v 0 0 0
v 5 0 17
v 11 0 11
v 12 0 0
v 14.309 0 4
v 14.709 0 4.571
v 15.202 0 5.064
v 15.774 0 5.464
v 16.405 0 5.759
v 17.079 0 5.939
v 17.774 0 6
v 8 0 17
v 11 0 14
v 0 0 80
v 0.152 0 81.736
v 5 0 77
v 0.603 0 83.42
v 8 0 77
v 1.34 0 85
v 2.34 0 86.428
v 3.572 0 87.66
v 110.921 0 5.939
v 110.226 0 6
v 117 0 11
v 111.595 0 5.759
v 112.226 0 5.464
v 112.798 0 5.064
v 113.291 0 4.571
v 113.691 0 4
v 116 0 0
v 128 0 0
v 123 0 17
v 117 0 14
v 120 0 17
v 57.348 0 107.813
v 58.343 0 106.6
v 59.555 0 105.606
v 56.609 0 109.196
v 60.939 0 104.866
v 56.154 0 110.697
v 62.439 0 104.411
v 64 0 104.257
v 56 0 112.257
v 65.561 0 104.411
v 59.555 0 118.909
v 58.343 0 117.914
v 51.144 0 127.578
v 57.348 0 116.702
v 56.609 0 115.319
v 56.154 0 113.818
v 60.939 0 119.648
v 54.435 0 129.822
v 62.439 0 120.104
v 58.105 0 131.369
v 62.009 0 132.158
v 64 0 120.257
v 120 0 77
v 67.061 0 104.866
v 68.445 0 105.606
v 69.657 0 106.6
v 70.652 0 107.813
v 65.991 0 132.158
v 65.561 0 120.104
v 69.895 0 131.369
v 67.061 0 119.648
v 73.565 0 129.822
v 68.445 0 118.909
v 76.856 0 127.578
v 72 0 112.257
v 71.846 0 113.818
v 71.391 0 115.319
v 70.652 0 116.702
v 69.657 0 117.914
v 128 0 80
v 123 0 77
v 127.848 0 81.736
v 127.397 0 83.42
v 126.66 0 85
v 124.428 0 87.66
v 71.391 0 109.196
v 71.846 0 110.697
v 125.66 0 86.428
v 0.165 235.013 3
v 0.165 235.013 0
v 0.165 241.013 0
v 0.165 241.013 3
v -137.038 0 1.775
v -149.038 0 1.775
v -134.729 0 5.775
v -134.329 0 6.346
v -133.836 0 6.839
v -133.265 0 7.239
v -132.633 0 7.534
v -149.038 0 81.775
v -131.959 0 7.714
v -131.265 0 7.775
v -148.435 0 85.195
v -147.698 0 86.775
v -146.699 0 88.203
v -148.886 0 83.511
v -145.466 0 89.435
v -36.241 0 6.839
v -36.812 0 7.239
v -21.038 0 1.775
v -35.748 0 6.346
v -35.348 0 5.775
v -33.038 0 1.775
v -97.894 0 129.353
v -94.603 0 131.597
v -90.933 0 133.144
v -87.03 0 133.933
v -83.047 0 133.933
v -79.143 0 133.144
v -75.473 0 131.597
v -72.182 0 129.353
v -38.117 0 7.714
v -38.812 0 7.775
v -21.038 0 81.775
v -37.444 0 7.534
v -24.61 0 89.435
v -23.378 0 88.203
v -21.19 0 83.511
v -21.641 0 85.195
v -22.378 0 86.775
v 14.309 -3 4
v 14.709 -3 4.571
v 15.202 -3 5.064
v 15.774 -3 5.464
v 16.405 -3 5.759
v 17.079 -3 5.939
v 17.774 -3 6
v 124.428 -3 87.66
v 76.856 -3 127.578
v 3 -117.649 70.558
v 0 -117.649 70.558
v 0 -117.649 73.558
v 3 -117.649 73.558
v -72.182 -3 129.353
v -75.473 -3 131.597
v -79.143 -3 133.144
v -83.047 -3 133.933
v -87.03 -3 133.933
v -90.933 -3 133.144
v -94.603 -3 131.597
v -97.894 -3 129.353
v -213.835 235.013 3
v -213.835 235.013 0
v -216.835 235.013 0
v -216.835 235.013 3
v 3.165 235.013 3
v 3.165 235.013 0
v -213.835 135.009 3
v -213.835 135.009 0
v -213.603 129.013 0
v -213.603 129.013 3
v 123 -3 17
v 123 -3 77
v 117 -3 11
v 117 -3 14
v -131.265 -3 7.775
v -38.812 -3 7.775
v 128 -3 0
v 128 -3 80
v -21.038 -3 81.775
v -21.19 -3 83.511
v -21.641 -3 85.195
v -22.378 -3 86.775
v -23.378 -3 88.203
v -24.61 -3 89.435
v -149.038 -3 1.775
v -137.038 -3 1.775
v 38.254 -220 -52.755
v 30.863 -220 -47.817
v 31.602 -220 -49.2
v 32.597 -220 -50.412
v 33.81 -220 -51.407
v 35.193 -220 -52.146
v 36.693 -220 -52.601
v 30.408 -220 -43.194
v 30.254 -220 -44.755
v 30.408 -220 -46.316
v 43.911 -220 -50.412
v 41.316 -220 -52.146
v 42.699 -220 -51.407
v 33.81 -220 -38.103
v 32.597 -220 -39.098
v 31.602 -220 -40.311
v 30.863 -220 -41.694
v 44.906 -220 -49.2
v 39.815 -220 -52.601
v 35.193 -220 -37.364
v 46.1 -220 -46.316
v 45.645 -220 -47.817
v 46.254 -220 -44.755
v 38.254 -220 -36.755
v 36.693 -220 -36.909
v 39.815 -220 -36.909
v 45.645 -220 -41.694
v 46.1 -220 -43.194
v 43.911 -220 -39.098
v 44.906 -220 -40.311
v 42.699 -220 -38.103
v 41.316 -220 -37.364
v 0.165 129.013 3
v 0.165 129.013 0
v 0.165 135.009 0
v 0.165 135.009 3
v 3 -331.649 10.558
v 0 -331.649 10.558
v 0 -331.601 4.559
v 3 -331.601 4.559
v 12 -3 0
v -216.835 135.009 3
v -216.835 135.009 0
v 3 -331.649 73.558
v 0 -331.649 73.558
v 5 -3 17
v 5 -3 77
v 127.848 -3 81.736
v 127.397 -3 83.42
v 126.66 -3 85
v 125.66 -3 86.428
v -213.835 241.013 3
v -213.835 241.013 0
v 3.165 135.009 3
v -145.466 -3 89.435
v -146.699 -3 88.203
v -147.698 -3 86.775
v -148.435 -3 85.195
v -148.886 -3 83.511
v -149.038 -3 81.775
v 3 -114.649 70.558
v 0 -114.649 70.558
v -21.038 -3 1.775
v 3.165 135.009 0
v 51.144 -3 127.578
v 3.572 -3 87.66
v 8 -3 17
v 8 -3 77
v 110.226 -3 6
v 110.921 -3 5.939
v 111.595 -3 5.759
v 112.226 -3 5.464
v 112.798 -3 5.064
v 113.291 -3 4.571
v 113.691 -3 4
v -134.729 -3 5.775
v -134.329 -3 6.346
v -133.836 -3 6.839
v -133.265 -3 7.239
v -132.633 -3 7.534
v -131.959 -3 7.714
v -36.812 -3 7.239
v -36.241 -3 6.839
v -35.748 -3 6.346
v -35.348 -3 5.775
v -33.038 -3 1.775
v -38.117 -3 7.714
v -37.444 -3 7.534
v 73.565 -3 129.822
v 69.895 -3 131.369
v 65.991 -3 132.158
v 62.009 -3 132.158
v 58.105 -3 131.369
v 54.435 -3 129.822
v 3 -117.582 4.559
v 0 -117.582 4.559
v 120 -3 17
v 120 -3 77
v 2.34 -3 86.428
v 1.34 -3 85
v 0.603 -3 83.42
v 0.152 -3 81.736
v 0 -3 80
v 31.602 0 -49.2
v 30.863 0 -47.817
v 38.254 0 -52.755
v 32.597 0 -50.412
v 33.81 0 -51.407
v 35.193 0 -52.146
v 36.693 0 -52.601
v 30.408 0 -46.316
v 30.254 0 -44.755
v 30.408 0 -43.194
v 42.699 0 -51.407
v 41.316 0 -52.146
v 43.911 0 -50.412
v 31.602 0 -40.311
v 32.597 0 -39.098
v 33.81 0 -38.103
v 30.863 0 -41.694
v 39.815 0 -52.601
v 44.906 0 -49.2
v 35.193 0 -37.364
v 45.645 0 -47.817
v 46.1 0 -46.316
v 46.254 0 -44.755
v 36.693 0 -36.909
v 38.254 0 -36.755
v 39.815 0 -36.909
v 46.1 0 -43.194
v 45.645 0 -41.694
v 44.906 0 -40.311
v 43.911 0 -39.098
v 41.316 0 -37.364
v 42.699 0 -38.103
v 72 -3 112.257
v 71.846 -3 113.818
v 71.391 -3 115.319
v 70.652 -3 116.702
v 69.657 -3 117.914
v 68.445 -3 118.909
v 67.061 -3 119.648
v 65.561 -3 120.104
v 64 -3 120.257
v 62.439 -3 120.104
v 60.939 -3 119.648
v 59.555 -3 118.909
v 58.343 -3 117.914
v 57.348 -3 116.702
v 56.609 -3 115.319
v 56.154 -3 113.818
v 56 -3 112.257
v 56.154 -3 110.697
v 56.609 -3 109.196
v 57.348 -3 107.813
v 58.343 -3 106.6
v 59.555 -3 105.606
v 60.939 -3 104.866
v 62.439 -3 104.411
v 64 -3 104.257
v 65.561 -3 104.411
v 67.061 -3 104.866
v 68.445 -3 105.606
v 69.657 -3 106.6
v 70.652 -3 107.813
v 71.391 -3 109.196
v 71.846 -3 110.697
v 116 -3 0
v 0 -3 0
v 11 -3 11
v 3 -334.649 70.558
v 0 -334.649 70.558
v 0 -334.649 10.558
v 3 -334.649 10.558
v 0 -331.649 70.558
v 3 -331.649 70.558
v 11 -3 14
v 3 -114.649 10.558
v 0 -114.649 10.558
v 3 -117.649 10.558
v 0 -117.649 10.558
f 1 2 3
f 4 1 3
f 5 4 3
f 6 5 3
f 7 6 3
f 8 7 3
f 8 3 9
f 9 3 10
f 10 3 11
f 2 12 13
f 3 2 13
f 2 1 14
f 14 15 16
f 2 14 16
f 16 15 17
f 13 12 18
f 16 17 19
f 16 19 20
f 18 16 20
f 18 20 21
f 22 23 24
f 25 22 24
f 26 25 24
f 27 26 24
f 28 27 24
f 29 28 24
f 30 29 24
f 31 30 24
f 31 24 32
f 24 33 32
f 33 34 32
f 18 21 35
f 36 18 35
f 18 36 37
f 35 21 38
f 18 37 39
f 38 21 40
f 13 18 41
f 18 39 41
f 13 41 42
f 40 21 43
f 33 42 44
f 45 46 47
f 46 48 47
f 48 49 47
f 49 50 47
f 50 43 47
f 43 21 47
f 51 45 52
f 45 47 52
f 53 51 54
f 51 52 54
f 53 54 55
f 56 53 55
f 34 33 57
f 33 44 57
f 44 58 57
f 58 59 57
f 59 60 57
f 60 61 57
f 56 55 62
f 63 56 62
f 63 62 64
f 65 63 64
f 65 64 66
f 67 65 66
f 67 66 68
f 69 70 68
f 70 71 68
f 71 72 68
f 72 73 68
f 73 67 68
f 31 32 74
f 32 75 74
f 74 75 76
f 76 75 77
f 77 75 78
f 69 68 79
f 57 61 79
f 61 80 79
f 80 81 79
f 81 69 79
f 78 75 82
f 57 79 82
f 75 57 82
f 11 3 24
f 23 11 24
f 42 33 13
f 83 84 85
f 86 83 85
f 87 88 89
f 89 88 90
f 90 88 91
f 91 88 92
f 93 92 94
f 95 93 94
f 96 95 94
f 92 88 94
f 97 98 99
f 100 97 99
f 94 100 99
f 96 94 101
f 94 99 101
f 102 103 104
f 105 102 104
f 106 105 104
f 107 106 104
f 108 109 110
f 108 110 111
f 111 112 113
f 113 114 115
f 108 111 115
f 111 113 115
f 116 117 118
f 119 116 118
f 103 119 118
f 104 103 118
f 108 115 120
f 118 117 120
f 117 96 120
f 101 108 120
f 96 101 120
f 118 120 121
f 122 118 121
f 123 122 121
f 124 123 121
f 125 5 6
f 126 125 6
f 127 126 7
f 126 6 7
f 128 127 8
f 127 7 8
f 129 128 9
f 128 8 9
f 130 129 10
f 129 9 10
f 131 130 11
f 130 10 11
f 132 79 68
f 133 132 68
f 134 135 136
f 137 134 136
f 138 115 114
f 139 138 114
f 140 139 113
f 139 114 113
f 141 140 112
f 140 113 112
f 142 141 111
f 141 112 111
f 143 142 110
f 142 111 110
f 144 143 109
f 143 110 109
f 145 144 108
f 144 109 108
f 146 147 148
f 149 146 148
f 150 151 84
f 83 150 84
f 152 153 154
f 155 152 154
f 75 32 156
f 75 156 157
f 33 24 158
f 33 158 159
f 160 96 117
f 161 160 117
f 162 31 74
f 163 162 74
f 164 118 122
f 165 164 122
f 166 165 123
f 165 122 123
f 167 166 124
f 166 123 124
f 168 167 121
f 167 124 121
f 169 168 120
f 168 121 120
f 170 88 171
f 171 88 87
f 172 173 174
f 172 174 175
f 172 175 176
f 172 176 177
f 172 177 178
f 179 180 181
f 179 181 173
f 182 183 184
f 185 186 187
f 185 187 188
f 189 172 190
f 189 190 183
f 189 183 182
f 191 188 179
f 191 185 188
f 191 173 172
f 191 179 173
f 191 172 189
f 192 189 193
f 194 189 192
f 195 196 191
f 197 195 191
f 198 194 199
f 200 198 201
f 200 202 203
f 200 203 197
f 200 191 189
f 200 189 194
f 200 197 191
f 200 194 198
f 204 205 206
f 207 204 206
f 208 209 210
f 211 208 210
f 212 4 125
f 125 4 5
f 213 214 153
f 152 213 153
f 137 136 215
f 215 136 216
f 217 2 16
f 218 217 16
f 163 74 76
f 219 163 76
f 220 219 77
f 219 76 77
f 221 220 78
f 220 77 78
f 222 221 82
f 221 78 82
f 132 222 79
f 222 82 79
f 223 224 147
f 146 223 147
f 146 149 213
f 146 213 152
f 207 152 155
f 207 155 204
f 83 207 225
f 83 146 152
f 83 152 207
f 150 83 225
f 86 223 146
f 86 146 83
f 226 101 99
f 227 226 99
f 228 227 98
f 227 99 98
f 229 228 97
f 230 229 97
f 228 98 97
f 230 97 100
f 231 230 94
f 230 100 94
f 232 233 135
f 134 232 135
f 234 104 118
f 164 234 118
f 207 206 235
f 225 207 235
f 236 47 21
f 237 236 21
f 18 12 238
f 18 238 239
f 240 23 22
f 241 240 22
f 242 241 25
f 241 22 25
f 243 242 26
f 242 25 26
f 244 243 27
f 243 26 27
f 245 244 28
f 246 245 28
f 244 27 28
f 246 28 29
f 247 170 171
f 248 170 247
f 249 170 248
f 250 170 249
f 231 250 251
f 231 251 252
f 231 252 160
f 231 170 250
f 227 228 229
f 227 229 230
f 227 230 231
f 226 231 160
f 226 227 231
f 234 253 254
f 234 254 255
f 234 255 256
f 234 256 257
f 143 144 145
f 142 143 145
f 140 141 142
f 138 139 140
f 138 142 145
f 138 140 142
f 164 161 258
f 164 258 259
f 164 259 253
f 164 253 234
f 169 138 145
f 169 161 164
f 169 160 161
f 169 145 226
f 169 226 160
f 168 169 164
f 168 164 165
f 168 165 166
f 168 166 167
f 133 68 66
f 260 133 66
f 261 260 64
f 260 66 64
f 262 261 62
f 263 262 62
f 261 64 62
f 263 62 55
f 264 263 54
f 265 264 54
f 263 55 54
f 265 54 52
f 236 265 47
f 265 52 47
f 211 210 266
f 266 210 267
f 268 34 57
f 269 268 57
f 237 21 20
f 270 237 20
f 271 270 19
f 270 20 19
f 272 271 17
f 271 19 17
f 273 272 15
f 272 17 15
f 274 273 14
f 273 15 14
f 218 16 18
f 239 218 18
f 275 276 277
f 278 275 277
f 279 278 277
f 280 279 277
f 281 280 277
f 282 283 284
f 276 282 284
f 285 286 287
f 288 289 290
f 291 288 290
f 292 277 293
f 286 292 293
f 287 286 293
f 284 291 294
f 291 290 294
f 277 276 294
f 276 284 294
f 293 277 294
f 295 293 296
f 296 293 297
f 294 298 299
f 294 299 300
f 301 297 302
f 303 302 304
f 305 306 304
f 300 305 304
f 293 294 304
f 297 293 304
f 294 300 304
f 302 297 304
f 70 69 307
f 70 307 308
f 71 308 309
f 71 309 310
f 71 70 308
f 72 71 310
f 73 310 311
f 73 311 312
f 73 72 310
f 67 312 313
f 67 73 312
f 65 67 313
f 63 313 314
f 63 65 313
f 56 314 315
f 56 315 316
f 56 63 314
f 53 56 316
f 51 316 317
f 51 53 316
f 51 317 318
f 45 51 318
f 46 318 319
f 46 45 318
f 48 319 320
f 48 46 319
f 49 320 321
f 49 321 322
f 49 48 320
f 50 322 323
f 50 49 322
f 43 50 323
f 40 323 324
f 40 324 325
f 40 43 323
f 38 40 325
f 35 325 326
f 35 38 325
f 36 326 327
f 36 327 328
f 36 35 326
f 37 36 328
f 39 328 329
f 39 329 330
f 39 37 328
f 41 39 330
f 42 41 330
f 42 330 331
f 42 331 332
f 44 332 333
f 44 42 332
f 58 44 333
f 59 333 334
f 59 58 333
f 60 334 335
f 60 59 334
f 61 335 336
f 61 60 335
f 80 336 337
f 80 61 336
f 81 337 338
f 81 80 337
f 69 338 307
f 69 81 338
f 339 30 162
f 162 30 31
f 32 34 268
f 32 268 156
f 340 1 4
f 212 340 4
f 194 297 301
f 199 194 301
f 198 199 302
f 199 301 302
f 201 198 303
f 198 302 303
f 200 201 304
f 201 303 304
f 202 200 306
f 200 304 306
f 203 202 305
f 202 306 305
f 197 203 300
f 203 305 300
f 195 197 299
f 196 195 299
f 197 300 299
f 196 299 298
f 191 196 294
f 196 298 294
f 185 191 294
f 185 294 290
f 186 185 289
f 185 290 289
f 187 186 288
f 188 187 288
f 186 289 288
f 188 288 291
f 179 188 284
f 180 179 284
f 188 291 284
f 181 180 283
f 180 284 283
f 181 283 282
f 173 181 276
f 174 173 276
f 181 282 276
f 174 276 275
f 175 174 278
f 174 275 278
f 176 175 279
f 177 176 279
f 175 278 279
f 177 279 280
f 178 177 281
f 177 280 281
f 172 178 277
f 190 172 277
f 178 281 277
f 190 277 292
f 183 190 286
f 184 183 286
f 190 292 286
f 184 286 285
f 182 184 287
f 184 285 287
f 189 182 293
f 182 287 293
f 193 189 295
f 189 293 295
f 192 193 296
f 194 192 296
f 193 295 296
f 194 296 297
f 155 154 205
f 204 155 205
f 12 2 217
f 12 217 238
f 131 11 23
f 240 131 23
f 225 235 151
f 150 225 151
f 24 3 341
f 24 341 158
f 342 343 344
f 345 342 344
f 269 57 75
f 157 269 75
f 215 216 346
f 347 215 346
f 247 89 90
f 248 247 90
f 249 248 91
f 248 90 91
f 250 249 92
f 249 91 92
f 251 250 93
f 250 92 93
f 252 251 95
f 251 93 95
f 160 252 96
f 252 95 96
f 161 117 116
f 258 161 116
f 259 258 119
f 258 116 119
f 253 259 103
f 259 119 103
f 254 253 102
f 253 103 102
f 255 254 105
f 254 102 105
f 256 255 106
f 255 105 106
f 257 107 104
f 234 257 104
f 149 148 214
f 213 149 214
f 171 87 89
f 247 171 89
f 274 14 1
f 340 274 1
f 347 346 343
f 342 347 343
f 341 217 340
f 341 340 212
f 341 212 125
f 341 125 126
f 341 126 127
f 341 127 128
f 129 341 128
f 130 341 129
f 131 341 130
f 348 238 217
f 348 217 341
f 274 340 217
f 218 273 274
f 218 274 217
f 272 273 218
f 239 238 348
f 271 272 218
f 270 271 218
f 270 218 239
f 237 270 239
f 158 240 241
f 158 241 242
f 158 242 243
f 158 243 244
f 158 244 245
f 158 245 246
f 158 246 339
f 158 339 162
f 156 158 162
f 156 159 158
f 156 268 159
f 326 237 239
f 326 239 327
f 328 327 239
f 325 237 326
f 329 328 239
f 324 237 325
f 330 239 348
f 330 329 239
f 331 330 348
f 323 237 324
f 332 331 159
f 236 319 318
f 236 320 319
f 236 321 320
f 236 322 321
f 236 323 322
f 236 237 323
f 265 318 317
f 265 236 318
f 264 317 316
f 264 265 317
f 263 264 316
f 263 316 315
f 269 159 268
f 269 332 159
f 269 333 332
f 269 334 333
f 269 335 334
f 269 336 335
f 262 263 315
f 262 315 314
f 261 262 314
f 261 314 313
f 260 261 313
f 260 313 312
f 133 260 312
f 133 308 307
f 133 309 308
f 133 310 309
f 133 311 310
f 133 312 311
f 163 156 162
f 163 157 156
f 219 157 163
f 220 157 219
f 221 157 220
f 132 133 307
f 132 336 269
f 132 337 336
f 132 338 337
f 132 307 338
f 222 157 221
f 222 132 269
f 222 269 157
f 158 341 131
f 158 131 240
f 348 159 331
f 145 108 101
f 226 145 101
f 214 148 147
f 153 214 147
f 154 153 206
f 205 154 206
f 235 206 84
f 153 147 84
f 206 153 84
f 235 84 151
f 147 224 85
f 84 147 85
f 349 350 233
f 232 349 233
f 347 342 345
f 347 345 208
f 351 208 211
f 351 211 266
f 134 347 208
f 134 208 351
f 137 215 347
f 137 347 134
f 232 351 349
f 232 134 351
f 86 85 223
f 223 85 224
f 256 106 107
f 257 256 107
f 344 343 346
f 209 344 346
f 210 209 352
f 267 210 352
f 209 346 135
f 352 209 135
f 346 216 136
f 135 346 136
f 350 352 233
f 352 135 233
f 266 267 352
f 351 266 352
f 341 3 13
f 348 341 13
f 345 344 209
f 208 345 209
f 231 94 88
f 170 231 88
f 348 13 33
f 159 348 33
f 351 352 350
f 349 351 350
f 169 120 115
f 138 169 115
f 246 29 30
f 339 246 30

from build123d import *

# Parameters (mm, degrees)
F0_W     = 3
F0_H     = 60
F0_W_2   = 106
F0_H_2   = 3
F0_R     = 8
F1_DEPTH = 3
F3_DEPTH = 3
F5_DEPTH = 3
F6_R     = 8
F7_DEPTH = 220
F9_DEPTH = 3


with BuildPart() as f1:
    # F0 (on Front) → F1 (new body)
    with BuildSketch(Plane.XZ):
        with BuildLine():
            Line((0, 80), (0, 0))
            Line((0, 0), (12, 0))
            Line((12, 0), (14.309401, 4))
            ThreePointArc((14.309401, 4), (15.773503, 5.464102), (17.773503, 6))
            Line((17.773503, 6), (110.226497, 6))
            ThreePointArc((110.226497, 6), (112.226497, 5.464102), (113.690599, 4))
            Line((113.690599, 4), (116, 0))
            Line((116, 0), (128, 0))
            Line((128, 0), (128, 80))
            ThreePointArc((128, 80), (127.063078, 84.226183), (124.427876, 87.660444))
            Line((124.427876, 87.660444), (76.855752, 127.578196))
            ThreePointArc((76.855752, 127.578196), (64, 132.257307), (51.144248, 127.578196))
            Line((51.144248, 127.578196), (3.572124, 87.660444))
            ThreePointArc((3.572124, 87.660444), (0.936922, 84.226183), (0, 80))
        make_face()
        with Locations((6.5, 47)):
            Rectangle(F0_W, F0_H, mode=Mode.SUBTRACT)
        with Locations((64, 12.5)):
            Rectangle(F0_W_2, F0_H_2, mode=Mode.SUBTRACT)
        with Locations((121.5, 47)):
            Rectangle(F0_W, F0_H, mode=Mode.SUBTRACT)
        with Locations((64, 112.257307)):
            Circle(F0_R, mode=Mode.SUBTRACT)
    extrude(amount=F1_DEPTH)


with BuildPart() as f3:
    # F2 (on Top) → F3 (new body)
    with BuildSketch(Plane.XY):
        Polygon((0.164736, 241.013441), (-213.835264, 241.013441), (-213.835264, 235.013441), (-216.835264, 235.013441), (-216.835264, 135.008938), (-213.835264, 135.008938), (-213.602845, 129.013441), (0.164736, 129.013441), (0.164736, 135.008938), (3.164736, 135.008938), (3.164736, 235.013441), (0.164736, 235.013441), align=None)
    extrude(amount=F3_DEPTH)


with BuildPart() as f5:
    # F4 (on Front) → F5 (new body)
    with BuildSketch(Plane.XZ):
        with BuildLine():
            Line((-149.038229, 81.775004), (-149.038229, 1.775004))
            Line((-149.038229, 1.775004), (-137.038229, 1.775004))
            Line((-137.038229, 1.775004), (-134.728828, 5.775004))
            ThreePointArc((-134.728828, 5.775004), (-133.264726, 7.239105), (-131.264726, 7.775004))
            Line((-131.264726, 7.775004), (-38.811732, 7.775004))
            ThreePointArc((-38.811732, 7.775004), (-36.811732, 7.239105), (-35.34763, 5.775004))
            Line((-35.34763, 5.775004), (-33.038229, 1.775004))
            Line((-33.038229, 1.775004), (-21.038229, 1.775004))
            Line((-21.038229, 1.775004), (-21.038229, 81.775004))
            ThreePointArc((-21.038229, 81.775004), (-21.975151, 86.001186), (-24.610353, 89.435448))
            Line((-24.610353, 89.435448), (-72.182477, 129.3532))
            ThreePointArc((-72.182477, 129.3532), (-85.038229, 134.032311), (-97.893981, 129.3532))
            Line((-97.893981, 129.3532), (-145.466105, 89.435448))
            ThreePointArc((-145.466105, 89.435448), (-148.101307, 86.001186), (-149.038229, 81.775004))
        make_face()
    extrude(amount=F5_DEPTH)


with BuildPart() as f7:
    # F6 (on Front) → F7 (new body)
    with BuildSketch(Plane.XZ):
        with Locations((38.254205, -44.755071)):
            Circle(F6_R)
    extrude(amount=F7_DEPTH)


with BuildPart() as f9:
    # F8 (on Right) → F9 (new body)
    with BuildSketch(Plane.YZ):
        Polygon((-117.649087, 70.55839), (-117.649087, 73.55839), (-331.649087, 73.55839), (-331.649087, 70.55839), (-334.649087, 70.55839), (-334.649087, 10.55839), (-331.649087, 10.55839), (-331.601357, 4.55858), (-117.582071, 4.55858), (-117.649087, 10.558205), (-114.649087, 10.558205), (-114.649087, 70.55839), align=None)
    extrude(amount=F9_DEPTH)


solid = Compound([f1.part, f3.part, f5.part, f7.part, f9.part])
